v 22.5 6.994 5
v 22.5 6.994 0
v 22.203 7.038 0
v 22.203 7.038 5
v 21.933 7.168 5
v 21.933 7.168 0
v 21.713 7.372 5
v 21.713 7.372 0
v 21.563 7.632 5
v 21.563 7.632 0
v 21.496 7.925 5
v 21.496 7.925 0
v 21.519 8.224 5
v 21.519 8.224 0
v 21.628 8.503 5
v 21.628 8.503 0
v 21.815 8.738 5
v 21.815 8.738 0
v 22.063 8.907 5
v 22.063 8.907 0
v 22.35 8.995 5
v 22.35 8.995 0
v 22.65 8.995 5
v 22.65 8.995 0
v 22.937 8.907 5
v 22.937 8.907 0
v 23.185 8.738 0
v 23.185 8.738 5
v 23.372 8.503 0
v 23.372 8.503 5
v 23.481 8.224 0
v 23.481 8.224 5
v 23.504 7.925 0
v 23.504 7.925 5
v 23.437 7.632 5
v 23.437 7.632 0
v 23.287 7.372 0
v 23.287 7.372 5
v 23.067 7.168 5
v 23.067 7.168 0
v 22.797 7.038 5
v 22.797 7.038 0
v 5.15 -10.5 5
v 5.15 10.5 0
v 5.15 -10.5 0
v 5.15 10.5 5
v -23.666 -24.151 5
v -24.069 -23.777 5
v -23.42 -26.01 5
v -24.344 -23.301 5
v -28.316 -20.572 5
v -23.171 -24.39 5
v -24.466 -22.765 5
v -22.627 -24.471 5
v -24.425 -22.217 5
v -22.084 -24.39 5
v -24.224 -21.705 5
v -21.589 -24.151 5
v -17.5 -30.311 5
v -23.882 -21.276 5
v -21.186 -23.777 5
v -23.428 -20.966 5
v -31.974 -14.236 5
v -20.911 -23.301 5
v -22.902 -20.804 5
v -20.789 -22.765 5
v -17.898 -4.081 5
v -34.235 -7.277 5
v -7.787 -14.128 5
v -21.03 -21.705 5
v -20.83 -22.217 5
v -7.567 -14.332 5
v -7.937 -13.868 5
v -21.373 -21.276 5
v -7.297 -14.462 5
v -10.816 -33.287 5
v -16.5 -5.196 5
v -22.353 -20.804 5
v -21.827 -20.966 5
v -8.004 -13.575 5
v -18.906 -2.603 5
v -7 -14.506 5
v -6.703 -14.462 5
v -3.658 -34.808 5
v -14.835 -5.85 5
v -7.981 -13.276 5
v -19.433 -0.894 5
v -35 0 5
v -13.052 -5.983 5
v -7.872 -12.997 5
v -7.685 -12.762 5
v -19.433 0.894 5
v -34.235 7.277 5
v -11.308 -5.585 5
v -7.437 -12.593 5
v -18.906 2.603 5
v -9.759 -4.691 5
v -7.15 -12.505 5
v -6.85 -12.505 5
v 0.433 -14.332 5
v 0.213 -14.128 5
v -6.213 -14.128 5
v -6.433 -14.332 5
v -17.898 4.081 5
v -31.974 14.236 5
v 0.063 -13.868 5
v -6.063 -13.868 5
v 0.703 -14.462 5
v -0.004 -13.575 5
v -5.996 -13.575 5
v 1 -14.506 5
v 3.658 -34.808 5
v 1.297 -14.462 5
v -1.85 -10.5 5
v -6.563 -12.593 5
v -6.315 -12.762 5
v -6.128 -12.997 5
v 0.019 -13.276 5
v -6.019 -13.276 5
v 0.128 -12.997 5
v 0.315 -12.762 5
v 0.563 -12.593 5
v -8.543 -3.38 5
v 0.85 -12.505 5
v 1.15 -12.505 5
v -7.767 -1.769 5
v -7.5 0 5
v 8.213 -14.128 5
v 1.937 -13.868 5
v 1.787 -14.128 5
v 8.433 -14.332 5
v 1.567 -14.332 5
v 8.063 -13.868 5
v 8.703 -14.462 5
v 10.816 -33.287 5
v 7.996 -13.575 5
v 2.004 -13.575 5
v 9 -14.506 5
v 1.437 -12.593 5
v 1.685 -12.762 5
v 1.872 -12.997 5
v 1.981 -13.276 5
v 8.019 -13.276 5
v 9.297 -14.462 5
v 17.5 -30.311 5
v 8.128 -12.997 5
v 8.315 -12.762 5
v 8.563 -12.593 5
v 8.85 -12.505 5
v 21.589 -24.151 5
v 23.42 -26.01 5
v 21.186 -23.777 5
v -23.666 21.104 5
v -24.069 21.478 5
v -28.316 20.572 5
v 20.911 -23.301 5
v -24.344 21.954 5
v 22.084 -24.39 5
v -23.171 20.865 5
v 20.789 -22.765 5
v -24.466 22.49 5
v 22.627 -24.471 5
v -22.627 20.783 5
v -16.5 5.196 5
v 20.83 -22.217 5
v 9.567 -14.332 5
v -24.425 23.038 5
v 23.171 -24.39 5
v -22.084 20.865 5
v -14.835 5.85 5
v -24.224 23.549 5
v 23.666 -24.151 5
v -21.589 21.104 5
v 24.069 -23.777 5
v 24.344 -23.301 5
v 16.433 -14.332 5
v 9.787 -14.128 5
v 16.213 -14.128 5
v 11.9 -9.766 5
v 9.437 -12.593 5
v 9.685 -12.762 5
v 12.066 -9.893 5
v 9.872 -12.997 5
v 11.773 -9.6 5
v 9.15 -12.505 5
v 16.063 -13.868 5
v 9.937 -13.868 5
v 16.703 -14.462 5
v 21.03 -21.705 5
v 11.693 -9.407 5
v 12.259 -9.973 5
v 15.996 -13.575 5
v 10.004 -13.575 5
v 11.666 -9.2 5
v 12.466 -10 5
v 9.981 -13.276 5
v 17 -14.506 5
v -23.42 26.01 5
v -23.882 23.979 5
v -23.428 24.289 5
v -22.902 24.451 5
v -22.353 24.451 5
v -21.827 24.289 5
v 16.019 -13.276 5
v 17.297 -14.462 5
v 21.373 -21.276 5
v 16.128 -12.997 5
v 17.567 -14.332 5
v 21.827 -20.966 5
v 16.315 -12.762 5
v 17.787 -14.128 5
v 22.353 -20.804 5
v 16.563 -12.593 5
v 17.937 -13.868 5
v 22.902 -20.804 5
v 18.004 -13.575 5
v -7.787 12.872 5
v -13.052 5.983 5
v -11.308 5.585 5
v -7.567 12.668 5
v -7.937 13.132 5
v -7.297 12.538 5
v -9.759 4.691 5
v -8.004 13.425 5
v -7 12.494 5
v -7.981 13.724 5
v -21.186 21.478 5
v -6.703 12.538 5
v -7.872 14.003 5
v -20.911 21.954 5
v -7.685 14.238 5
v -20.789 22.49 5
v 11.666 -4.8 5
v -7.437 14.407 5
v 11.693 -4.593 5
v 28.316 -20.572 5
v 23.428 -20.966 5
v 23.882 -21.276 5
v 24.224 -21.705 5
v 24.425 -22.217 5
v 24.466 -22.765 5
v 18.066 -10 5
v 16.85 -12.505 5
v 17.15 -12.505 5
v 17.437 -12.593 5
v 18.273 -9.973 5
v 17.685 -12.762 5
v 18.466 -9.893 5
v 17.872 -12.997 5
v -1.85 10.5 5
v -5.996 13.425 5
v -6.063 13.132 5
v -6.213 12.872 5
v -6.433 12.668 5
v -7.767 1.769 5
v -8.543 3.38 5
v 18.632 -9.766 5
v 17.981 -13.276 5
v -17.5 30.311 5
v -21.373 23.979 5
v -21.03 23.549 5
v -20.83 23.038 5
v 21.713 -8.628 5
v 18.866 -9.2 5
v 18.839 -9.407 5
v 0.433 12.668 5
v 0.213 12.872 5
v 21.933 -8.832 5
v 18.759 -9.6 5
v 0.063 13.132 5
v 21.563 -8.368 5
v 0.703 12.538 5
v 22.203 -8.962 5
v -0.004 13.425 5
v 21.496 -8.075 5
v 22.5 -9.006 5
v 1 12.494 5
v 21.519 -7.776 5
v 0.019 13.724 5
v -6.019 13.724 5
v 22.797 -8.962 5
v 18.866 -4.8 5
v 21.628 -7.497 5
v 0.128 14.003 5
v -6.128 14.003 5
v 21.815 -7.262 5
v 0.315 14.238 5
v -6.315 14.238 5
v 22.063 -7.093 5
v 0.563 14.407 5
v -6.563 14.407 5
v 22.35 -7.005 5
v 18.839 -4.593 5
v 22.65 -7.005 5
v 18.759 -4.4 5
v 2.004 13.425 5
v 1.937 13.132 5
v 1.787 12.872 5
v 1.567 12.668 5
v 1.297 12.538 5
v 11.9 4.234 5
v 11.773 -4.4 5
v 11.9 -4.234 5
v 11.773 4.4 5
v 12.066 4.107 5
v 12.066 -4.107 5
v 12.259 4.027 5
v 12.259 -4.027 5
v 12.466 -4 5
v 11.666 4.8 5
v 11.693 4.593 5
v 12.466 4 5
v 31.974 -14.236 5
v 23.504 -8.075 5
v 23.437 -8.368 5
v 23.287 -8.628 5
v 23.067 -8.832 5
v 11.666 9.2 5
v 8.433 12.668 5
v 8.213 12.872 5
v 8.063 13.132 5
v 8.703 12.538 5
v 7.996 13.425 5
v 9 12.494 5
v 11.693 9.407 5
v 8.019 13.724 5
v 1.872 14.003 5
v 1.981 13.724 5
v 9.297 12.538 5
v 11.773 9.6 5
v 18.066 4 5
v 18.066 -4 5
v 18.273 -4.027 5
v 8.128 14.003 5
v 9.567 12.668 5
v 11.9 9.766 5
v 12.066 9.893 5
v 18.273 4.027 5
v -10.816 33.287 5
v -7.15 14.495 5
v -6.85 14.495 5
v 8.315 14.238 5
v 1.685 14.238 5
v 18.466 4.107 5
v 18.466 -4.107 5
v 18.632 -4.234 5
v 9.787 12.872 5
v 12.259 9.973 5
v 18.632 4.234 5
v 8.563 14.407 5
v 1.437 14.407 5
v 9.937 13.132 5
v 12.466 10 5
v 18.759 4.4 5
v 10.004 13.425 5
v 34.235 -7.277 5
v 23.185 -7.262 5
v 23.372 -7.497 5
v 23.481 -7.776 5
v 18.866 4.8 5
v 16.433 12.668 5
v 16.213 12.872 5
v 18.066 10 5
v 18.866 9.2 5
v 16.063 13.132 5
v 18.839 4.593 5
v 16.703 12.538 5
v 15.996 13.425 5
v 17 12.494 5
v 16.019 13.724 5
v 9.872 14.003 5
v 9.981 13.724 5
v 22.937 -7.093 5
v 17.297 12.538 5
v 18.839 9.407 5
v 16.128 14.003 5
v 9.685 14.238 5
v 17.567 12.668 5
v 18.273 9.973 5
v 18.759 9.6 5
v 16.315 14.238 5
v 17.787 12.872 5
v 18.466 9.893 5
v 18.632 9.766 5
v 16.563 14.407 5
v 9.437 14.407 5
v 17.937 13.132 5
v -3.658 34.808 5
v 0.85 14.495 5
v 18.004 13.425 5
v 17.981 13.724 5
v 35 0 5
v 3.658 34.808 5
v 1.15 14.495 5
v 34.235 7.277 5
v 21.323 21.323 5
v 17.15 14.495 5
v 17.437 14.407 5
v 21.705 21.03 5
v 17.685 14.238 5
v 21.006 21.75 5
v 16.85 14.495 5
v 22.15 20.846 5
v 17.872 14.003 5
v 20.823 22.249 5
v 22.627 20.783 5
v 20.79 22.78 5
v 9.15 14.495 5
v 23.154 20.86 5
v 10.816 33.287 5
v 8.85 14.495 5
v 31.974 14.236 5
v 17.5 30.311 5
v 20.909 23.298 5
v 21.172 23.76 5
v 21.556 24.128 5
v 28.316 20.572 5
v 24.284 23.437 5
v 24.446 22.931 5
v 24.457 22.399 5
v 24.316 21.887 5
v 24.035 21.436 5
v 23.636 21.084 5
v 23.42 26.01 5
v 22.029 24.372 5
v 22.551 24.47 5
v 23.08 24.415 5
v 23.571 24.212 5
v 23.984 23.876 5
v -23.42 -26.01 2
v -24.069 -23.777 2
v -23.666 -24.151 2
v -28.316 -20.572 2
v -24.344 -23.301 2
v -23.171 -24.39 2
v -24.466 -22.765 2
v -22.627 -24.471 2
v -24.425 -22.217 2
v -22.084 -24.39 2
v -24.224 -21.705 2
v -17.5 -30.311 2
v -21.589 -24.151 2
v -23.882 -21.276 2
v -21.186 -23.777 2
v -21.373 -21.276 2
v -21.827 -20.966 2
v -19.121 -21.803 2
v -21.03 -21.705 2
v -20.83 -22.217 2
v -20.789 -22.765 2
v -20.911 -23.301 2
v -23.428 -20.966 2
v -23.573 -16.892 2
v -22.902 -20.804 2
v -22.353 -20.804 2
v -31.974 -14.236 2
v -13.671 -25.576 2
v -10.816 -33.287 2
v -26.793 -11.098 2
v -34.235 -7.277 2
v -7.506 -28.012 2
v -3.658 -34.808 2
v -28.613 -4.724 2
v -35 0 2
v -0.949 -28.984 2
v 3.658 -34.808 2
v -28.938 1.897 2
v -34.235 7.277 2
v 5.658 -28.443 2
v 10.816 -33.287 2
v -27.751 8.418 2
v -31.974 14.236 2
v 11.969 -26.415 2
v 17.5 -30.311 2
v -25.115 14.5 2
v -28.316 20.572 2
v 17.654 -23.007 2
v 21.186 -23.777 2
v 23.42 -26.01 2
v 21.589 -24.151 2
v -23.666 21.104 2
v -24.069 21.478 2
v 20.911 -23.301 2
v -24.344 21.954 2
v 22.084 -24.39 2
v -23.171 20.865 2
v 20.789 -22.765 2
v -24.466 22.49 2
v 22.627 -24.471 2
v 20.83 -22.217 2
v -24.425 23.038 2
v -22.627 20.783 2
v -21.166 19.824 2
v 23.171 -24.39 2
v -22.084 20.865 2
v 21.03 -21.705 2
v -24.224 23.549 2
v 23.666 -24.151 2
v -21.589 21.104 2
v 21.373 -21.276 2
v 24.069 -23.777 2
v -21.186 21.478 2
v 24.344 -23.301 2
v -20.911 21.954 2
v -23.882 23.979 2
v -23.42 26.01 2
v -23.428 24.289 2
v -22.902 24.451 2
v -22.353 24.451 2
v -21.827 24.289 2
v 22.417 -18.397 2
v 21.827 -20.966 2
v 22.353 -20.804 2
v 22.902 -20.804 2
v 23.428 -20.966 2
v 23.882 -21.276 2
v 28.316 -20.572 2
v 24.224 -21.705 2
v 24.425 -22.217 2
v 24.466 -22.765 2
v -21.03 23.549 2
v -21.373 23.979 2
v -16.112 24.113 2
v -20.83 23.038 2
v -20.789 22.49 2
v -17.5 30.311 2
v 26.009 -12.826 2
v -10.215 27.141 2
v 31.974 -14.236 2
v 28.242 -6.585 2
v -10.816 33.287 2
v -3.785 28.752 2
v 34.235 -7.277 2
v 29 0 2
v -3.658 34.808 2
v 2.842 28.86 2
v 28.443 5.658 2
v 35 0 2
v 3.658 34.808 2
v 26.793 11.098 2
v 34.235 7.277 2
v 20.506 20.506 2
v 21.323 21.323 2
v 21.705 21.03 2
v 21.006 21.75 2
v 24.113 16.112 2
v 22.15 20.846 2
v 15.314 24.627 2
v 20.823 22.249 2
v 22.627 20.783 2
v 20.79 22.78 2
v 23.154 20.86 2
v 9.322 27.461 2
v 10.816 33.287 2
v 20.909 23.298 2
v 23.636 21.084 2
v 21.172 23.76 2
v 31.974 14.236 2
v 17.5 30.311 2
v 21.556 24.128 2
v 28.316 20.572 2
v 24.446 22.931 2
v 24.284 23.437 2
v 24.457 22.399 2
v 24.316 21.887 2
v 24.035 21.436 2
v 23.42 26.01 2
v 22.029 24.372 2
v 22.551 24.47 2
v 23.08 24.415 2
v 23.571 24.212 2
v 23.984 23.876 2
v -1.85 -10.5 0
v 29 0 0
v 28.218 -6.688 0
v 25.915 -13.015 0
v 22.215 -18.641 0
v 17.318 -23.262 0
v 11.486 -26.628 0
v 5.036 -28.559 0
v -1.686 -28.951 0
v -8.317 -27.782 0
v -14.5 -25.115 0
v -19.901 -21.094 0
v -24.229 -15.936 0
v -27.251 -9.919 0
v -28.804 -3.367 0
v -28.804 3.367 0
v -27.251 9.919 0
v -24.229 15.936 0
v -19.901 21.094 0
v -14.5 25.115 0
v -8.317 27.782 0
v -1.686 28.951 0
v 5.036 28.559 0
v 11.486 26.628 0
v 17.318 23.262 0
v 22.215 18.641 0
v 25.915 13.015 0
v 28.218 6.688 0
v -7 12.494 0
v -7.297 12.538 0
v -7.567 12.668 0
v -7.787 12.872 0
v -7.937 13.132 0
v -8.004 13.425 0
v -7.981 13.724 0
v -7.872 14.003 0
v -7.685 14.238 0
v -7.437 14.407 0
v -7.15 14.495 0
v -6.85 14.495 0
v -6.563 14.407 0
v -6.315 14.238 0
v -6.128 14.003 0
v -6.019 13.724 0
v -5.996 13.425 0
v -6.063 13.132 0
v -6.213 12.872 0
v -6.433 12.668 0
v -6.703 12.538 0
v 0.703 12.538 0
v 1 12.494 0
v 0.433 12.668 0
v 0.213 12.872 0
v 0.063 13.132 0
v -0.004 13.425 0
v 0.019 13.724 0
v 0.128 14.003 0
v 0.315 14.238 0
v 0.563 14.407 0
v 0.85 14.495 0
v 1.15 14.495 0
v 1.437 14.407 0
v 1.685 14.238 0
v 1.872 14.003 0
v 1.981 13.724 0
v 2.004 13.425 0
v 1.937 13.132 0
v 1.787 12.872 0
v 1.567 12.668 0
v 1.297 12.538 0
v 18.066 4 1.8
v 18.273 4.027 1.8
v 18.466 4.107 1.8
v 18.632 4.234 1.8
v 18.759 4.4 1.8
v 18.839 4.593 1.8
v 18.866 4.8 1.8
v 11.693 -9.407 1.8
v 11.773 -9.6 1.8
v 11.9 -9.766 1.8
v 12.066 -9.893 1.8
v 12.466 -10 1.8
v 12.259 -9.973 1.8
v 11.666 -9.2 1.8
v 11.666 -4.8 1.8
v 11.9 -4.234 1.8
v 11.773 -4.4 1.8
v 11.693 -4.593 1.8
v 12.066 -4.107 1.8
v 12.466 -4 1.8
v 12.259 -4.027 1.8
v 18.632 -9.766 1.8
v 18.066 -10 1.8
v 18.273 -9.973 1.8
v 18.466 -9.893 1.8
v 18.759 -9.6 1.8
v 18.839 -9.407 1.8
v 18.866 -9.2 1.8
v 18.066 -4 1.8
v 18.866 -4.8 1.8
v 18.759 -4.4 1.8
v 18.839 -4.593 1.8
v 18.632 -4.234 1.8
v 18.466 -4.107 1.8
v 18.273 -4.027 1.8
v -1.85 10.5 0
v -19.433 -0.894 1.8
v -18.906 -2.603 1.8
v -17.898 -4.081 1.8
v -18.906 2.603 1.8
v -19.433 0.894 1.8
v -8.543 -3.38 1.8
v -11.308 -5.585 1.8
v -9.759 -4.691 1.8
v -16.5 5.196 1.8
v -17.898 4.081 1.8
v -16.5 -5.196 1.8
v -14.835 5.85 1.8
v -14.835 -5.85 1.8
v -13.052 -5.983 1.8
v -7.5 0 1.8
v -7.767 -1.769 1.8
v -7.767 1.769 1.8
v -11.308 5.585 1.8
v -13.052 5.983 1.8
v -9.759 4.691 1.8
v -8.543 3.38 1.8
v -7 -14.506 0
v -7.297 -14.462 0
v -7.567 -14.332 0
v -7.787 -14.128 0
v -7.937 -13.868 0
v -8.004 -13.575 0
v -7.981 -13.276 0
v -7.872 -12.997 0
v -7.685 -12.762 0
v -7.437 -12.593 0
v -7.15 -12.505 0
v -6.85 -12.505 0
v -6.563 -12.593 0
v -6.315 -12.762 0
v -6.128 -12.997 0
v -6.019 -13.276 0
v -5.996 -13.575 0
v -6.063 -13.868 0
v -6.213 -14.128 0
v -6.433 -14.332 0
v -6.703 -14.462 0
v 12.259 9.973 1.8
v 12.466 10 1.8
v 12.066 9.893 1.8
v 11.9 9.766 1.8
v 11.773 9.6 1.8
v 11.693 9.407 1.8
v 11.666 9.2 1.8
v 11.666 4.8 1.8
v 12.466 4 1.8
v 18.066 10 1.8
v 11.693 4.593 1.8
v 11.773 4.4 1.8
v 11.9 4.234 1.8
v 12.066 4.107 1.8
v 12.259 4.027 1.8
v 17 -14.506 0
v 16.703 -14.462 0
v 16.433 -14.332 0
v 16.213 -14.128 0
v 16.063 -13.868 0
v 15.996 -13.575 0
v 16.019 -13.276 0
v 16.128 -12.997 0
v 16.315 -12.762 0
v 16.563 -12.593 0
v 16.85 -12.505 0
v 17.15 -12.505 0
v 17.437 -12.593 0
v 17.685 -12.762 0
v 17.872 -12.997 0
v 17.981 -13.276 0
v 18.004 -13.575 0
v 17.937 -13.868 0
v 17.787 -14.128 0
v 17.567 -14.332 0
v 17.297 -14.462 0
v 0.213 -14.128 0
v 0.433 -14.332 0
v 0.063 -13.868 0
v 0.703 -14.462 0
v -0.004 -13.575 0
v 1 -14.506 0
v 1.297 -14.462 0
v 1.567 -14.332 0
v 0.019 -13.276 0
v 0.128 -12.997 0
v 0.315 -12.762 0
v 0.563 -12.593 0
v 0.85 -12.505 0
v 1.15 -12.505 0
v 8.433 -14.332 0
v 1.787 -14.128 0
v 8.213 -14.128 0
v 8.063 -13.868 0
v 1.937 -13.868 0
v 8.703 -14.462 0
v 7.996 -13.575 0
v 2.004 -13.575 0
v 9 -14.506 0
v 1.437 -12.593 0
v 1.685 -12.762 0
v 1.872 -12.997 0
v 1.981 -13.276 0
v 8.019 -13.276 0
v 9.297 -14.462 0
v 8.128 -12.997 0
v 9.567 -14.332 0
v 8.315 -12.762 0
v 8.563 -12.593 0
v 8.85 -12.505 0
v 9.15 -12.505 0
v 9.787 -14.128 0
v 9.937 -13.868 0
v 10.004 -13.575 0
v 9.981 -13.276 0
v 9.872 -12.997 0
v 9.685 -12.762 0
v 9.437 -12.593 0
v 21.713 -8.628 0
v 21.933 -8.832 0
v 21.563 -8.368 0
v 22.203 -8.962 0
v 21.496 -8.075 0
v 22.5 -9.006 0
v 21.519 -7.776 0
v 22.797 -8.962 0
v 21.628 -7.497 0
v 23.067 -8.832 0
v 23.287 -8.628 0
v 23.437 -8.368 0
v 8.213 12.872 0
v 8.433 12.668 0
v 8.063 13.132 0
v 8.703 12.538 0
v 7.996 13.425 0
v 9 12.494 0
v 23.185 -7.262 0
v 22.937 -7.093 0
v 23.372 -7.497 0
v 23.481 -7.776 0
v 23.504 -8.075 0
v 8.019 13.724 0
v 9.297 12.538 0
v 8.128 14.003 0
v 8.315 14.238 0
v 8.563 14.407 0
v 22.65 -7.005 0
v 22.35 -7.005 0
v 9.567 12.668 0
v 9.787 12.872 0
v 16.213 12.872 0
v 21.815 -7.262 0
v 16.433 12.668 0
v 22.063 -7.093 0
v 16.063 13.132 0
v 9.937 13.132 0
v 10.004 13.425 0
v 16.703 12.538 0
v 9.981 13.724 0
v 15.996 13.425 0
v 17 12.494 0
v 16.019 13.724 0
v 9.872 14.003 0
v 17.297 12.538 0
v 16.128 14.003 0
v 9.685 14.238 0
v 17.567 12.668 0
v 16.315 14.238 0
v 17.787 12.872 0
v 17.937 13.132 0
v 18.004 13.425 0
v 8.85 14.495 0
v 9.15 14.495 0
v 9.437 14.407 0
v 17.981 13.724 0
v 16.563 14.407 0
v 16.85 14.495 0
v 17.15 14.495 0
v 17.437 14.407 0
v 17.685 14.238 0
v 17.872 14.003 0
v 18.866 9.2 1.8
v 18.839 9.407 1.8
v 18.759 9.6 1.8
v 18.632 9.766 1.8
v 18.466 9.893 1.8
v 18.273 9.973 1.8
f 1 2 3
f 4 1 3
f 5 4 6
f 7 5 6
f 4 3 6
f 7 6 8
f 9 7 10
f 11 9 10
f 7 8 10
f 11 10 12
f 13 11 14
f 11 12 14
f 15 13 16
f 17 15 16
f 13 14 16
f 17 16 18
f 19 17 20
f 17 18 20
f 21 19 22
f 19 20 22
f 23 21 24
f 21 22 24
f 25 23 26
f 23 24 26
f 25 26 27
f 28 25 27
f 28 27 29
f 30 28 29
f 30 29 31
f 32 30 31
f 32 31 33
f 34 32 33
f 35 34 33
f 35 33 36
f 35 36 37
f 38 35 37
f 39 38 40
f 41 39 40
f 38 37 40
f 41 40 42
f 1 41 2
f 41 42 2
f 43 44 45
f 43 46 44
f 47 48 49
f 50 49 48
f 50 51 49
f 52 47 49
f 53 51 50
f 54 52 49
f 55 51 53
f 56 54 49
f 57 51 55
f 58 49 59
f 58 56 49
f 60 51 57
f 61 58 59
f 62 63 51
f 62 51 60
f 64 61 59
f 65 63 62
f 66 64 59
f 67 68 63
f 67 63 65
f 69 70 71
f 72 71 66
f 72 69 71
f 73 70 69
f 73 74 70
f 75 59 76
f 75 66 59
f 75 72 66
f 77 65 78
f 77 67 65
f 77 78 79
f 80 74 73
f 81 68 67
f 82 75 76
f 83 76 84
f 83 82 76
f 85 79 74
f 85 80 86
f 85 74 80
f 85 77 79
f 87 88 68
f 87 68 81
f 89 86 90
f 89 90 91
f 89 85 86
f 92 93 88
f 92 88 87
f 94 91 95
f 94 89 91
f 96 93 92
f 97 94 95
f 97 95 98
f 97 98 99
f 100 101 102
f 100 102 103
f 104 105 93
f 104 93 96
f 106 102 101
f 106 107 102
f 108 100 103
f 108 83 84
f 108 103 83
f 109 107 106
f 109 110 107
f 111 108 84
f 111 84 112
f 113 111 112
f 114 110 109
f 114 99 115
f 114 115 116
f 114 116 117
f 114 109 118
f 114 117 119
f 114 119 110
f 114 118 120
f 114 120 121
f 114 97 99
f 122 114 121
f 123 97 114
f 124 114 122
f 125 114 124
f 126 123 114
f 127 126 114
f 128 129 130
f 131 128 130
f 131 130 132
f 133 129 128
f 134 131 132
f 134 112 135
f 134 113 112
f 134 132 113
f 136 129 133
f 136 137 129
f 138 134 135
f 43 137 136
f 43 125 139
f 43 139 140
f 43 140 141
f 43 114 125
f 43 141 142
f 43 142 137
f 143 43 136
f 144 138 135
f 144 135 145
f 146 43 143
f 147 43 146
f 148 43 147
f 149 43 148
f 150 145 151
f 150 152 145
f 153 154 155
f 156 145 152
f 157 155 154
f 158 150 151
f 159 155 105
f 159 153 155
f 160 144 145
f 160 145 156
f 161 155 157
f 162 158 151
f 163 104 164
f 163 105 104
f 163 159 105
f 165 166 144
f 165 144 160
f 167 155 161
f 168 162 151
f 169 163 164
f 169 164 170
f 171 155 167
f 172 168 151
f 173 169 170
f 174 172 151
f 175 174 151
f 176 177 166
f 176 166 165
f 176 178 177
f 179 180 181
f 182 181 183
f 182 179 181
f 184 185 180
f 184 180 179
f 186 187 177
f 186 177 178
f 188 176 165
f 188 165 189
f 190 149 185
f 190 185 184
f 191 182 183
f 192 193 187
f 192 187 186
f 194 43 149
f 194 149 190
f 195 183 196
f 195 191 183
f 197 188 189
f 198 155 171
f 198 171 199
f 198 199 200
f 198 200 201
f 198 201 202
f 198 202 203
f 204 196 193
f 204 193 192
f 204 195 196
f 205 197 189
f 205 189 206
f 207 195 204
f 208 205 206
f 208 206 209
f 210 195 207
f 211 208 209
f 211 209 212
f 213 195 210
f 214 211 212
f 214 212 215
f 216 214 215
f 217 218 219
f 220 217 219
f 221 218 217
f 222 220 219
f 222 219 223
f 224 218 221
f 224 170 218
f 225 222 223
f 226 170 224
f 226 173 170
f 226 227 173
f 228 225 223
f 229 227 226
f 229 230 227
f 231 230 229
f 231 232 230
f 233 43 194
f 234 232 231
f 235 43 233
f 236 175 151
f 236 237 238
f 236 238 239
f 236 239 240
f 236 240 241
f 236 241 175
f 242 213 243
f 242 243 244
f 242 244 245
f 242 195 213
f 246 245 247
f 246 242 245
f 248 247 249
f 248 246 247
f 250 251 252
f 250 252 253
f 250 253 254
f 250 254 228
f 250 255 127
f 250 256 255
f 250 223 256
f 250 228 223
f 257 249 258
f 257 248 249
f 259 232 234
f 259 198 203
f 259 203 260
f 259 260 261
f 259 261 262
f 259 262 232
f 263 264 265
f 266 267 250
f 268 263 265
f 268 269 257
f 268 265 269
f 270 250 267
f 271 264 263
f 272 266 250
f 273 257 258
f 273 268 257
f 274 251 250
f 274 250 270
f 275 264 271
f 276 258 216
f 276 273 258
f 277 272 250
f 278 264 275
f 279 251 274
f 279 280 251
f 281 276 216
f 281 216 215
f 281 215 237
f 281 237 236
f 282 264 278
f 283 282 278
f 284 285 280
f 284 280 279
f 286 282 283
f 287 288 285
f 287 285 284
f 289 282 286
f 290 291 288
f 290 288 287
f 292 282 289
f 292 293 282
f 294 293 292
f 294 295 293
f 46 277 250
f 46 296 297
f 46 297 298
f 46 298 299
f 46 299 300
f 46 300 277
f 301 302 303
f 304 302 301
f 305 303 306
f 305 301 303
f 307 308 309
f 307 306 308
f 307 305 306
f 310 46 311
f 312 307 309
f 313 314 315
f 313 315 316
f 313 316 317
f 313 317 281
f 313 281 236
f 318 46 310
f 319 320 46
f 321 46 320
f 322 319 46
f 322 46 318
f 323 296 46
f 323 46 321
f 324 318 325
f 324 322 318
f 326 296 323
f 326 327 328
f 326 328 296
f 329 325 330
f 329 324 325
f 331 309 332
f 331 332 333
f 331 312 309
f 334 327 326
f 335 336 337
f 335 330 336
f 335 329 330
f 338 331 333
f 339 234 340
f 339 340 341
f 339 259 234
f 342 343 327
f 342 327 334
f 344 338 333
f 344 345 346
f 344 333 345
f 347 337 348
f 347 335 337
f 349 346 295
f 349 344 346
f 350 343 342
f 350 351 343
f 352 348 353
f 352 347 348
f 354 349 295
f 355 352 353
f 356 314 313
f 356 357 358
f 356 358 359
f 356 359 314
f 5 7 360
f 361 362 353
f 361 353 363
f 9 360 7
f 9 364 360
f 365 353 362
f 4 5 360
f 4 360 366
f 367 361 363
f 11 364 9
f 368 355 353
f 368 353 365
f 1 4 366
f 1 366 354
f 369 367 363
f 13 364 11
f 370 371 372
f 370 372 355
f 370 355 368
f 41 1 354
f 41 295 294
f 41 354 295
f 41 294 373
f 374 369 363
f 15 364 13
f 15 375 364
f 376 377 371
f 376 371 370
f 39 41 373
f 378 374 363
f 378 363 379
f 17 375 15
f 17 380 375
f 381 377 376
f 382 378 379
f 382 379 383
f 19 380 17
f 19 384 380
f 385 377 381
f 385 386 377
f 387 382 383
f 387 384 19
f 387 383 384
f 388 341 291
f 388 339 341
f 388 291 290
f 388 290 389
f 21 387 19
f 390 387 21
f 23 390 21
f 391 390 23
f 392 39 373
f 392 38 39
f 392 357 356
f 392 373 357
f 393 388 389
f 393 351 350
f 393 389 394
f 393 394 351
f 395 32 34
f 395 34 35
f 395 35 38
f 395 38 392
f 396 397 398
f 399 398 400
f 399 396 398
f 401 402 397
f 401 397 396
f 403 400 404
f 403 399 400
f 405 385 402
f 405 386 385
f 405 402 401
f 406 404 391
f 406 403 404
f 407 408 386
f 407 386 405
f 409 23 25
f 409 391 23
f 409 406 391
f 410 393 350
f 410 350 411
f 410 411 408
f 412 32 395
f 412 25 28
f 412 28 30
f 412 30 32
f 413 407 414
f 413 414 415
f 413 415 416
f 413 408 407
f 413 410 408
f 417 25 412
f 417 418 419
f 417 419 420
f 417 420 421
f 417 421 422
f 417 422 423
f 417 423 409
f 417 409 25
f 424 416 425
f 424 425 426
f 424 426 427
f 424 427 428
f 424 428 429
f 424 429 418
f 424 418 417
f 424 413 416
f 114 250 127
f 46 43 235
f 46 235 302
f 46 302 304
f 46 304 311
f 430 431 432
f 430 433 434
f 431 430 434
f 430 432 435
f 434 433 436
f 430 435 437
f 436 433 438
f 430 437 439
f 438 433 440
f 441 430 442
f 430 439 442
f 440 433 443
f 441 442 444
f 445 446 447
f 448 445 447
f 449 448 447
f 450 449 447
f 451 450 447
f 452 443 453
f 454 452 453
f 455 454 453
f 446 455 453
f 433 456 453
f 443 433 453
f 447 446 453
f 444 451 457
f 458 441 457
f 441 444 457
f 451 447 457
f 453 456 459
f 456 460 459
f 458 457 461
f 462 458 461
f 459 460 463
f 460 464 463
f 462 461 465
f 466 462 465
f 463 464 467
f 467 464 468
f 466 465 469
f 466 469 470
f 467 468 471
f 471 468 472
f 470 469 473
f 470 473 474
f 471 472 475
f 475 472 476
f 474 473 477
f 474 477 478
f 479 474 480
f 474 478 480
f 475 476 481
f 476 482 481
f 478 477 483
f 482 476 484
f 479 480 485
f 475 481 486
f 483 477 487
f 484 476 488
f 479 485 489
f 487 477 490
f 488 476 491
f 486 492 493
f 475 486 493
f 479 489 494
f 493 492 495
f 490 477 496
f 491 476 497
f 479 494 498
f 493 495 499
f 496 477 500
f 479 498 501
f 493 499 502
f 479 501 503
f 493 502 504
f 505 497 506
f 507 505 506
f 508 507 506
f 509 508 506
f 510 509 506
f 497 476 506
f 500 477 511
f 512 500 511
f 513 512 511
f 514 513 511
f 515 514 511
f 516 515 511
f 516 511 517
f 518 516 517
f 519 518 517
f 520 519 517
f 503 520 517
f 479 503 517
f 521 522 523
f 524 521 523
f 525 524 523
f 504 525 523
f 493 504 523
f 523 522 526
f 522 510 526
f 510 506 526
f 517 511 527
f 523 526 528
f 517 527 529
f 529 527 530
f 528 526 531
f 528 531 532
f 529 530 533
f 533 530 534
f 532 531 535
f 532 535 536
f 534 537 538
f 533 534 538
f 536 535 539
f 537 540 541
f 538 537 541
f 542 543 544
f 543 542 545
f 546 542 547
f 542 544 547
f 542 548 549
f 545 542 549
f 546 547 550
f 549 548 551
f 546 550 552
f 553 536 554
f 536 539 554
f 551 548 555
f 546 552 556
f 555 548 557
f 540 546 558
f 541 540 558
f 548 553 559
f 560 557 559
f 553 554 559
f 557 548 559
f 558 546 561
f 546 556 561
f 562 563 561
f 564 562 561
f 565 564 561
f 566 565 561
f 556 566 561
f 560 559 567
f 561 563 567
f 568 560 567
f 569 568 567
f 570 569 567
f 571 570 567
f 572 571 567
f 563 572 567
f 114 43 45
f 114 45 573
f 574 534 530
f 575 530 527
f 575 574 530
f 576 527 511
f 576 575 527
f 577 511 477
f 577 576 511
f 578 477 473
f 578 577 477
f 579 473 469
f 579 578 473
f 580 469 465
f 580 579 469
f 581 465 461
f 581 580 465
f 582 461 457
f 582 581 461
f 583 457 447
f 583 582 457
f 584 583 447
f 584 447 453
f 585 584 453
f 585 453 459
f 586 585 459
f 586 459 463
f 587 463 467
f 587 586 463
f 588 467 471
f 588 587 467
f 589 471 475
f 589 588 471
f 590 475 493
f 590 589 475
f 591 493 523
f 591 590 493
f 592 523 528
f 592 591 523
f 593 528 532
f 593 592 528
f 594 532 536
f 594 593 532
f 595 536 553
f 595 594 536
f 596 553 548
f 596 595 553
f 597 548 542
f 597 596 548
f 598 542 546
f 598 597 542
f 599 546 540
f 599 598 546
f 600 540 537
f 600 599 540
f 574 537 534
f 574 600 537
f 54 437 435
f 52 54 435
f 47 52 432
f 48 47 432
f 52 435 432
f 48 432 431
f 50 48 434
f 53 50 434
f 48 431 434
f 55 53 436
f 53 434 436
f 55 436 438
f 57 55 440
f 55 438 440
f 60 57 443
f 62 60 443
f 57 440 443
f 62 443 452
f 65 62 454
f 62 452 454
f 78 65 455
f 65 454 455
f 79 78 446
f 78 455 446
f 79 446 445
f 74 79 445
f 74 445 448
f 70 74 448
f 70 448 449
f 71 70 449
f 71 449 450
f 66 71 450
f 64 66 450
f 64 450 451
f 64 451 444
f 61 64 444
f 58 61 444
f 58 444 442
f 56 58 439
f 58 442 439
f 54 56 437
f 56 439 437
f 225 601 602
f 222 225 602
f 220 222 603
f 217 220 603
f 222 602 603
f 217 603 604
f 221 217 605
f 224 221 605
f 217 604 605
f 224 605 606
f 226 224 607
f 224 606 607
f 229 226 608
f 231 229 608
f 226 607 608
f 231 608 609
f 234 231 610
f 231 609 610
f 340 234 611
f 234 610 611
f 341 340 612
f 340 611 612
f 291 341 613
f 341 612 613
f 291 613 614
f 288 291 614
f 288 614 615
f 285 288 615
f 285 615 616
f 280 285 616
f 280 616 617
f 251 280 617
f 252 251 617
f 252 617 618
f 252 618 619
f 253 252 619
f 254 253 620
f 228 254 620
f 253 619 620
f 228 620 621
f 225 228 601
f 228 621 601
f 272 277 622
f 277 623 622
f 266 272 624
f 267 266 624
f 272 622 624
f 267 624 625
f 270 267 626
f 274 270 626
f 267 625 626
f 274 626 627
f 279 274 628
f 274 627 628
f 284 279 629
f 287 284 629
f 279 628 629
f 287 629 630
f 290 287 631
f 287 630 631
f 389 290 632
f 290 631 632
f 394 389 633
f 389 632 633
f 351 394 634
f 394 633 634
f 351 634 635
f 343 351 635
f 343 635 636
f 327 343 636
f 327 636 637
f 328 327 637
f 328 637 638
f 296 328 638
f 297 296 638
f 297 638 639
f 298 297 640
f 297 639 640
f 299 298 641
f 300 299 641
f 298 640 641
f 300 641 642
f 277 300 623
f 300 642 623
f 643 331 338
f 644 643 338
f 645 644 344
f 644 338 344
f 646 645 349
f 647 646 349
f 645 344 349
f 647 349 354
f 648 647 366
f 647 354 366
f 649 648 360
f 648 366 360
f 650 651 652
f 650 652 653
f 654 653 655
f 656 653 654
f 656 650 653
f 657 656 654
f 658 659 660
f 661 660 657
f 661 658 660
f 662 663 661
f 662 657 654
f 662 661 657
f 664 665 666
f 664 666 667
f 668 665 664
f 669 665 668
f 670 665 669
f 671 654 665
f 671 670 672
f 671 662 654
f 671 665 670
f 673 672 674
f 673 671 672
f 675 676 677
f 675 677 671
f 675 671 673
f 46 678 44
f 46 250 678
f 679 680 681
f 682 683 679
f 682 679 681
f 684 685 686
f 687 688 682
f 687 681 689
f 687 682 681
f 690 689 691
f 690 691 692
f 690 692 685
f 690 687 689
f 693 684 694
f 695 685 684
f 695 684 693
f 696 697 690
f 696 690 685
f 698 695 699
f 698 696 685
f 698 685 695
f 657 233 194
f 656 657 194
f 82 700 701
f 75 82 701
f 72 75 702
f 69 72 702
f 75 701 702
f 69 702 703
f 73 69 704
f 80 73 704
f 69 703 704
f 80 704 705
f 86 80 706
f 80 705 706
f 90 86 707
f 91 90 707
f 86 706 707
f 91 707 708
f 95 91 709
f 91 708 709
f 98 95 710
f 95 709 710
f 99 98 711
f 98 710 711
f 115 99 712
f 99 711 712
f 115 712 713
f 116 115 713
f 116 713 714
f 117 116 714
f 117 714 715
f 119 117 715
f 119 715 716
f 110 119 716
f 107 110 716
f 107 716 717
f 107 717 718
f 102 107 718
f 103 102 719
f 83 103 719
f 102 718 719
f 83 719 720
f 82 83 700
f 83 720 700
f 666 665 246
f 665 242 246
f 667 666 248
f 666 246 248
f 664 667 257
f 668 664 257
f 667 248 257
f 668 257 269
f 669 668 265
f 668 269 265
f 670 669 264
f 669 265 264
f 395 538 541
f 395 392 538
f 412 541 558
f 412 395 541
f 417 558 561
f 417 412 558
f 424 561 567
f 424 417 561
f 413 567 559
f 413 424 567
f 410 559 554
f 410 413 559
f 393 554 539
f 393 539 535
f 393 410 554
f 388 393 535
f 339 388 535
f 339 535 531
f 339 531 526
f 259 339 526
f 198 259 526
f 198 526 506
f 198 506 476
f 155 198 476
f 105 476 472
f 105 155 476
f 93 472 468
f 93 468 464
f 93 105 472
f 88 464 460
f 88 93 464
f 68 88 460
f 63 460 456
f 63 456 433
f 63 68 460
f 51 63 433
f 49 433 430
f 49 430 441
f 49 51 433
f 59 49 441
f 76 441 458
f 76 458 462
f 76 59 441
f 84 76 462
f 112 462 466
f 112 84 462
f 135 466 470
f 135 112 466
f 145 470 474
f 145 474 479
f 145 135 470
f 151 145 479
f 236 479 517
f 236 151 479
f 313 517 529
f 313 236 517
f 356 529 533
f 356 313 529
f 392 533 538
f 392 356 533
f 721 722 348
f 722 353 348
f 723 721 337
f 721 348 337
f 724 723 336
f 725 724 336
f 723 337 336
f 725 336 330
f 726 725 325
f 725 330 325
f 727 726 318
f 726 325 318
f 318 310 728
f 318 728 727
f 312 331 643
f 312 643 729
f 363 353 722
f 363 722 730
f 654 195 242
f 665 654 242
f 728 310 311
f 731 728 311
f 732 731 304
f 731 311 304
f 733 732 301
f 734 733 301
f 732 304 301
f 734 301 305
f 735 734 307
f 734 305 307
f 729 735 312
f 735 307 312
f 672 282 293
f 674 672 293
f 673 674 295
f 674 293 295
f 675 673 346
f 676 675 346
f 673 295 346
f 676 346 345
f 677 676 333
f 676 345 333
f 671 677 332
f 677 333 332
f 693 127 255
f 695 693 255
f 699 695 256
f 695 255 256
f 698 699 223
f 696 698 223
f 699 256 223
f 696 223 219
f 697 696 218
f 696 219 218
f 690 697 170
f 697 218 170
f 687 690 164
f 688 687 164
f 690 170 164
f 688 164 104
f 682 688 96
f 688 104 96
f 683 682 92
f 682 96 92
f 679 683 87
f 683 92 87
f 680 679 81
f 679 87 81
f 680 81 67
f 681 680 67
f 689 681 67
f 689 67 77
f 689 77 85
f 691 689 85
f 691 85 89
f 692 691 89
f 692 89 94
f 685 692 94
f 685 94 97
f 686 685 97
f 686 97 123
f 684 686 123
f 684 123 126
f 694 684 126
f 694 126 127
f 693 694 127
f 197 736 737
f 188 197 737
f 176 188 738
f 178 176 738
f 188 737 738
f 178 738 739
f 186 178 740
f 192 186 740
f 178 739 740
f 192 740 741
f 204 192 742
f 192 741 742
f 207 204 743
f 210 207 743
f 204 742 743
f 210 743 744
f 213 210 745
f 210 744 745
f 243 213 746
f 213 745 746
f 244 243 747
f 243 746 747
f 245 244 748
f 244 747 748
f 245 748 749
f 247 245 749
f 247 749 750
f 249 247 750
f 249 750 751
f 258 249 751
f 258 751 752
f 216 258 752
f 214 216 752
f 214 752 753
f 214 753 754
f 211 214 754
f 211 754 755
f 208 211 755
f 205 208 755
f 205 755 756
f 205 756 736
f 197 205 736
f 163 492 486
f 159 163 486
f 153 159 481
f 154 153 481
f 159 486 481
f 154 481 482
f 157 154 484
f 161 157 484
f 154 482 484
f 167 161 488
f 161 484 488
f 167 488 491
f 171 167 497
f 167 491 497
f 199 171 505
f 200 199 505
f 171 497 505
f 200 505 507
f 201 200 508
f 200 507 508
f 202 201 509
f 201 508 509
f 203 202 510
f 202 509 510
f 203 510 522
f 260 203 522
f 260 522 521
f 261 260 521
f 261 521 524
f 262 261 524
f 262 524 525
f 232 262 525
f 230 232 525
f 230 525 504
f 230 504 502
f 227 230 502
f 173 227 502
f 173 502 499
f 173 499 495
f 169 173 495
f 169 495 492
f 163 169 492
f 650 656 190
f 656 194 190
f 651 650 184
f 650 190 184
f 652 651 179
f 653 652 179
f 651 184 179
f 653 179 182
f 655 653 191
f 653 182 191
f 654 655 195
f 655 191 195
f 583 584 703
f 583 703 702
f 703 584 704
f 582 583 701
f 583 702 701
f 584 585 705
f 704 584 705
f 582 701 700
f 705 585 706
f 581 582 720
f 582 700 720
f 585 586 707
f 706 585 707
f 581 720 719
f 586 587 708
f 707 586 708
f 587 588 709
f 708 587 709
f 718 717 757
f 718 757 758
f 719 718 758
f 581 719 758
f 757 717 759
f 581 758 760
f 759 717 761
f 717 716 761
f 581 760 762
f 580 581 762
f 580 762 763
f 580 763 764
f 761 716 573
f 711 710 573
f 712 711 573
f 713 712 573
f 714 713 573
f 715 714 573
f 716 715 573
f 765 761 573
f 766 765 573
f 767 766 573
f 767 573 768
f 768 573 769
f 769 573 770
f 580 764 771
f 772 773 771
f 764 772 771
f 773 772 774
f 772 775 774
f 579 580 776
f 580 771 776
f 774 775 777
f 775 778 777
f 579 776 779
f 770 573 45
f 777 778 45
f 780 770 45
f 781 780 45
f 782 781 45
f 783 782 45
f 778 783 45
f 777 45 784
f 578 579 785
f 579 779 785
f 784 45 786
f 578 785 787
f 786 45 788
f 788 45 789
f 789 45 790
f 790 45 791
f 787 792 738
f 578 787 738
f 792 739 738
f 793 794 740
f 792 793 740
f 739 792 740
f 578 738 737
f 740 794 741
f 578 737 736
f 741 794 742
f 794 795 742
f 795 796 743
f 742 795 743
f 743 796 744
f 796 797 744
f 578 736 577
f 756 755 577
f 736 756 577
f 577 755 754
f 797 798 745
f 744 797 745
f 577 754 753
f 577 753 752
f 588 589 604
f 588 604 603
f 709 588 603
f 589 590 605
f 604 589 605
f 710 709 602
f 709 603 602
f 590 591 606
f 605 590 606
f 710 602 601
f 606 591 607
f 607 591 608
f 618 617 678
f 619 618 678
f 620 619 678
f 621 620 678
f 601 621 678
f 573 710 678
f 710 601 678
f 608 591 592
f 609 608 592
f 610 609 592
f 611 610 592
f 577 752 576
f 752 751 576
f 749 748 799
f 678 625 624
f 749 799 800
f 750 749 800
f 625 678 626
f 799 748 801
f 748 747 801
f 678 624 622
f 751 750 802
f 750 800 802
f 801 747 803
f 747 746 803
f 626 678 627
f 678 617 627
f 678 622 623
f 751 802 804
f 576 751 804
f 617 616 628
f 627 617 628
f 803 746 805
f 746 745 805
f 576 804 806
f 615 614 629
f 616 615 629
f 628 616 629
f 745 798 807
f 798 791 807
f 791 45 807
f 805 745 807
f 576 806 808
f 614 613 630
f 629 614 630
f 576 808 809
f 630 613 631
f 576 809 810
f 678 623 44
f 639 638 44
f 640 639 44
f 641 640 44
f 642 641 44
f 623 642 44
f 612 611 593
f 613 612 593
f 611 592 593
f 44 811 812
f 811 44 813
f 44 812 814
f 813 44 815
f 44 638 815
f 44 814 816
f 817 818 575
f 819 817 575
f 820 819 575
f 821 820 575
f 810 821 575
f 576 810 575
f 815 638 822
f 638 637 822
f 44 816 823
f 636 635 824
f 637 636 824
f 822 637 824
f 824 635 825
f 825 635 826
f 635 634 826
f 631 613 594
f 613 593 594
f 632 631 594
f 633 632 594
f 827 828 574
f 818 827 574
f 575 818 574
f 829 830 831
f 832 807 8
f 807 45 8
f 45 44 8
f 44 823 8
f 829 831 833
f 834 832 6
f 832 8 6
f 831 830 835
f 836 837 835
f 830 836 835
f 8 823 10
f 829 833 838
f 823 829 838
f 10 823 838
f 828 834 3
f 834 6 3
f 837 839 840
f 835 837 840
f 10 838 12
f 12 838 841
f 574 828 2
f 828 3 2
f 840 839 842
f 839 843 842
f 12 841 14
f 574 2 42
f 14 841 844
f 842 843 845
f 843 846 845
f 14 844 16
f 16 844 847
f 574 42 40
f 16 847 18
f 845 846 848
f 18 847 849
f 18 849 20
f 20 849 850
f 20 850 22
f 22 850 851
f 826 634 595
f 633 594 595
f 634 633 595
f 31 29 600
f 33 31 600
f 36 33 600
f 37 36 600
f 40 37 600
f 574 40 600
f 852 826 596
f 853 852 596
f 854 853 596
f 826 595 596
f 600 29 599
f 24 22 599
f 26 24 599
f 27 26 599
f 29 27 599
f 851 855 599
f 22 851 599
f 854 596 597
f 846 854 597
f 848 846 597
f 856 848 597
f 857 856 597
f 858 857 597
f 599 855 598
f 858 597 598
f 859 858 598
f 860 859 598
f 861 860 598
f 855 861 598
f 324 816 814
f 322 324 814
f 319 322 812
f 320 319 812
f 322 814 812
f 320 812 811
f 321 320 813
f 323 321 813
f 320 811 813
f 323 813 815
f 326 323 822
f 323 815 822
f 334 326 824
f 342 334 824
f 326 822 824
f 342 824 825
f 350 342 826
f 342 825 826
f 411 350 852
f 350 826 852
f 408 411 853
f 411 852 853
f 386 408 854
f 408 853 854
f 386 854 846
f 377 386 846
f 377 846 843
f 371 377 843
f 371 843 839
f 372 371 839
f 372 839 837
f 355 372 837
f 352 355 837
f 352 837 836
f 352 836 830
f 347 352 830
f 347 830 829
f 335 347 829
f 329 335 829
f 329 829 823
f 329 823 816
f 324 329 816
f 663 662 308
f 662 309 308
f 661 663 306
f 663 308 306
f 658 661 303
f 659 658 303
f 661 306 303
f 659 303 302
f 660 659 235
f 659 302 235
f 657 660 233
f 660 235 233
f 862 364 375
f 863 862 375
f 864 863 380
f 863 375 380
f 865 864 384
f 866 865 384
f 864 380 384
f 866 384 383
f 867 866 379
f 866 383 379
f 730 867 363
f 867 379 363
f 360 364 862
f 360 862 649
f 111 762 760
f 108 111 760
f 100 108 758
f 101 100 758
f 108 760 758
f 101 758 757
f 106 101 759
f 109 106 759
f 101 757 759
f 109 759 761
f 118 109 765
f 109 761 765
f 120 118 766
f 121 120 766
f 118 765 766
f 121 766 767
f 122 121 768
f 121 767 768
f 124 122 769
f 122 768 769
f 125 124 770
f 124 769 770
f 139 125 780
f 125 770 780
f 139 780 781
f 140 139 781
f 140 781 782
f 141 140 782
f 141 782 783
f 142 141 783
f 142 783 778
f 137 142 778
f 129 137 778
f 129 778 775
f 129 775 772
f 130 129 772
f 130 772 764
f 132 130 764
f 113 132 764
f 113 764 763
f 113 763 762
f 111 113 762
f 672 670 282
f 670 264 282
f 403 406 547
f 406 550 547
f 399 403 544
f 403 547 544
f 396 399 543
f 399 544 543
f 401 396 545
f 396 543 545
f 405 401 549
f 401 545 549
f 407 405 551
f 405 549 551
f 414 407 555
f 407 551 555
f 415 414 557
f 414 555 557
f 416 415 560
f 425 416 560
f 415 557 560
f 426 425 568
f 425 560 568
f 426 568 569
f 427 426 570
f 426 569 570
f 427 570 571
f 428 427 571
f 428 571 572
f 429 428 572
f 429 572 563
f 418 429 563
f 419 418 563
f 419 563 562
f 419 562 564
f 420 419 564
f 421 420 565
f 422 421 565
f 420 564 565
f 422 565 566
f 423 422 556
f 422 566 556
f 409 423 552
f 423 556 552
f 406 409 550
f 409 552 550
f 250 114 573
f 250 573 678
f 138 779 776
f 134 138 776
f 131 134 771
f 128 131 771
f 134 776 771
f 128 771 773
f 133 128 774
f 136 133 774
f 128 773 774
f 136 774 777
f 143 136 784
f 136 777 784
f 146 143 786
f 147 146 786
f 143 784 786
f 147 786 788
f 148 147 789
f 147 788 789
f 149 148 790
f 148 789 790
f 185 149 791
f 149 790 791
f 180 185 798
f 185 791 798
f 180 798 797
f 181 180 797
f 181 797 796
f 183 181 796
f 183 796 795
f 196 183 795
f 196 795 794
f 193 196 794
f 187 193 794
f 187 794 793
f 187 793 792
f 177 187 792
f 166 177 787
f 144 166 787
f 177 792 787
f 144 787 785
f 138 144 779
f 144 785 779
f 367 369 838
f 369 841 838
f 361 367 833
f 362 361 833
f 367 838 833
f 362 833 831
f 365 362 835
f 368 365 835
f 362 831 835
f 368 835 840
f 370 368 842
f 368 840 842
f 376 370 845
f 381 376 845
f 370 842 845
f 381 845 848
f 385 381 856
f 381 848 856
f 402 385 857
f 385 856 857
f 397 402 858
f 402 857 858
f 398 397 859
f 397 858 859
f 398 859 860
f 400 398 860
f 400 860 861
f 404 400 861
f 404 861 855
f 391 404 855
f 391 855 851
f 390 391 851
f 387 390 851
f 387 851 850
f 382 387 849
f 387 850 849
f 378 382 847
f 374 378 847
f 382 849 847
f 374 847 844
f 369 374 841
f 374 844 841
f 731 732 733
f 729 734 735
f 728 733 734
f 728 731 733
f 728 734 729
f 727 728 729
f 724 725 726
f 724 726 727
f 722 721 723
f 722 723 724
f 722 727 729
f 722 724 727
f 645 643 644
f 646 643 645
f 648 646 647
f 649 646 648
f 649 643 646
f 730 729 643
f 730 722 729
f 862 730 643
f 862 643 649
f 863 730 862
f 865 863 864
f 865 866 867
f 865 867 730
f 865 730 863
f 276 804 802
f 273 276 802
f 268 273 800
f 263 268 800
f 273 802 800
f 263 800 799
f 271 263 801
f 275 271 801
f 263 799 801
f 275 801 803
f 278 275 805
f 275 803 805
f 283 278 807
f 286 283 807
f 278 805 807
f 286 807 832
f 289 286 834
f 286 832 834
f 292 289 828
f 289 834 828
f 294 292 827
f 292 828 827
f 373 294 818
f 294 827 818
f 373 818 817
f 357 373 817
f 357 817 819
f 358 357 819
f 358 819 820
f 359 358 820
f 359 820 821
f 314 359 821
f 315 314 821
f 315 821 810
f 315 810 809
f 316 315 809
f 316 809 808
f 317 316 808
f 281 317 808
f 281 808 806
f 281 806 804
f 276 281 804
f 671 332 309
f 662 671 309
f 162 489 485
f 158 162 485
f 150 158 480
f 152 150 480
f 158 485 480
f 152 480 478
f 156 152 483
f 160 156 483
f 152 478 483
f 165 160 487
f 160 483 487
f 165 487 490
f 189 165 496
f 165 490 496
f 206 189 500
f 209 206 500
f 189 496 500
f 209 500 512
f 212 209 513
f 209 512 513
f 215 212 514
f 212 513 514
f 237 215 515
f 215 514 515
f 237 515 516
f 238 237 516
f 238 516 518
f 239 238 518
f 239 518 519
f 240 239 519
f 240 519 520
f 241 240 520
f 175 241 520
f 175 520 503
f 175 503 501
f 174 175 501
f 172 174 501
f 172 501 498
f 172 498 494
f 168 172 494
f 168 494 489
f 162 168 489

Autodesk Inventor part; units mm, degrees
ref_plane "YZ Plane" through (0, 0, 0) normal (1, 0, 0) x (0, 1, 0)
ref_plane "XZ Plane" through (0, 0, 0) normal (0, 1, 0) x (-1, 0, 0)
ref_plane "XY Plane" through (0, 0, 0) normal (0, 0, 1) x (1, 0, 0)
sketch "Boceto1" plane through (0, 0, 0) normal (0, 0, 1) x (1, 0, 0)
  circle A0 centre (0, 0) radius 29
  dimension "Diametro" = 58
extrude "Extrusión1" add sketch "Boceto1" along normal blind 5
sketch "Boceto2" plane through (0, 0, 5) normal (0, 0, 1) x (1, 0, 0)
  circle A0 centre (1, -13.5) radius 1
  arc A1 (11.666, -9.2) -> (12.466, -10) centre (12.466, -9.2) ccw
  line L0 (5.15, -10.5) -> (-1.85, -10.5)
  circle A2 centre (9, -13.5) radius 1
  line L1 (5.15, 10.5) -> (5.15, -10.5)
  line L2 (25, 16) -> (25, -16)
  line L3 (25, -16) -> (-25, -16)
  line L4 (-25, 16) -> (25, 16)
  line L5 (-25, -16) -> (25, 16) construction
  line L6 (25, -16) -> (-25, 16) construction
  arc A3 (18.866, -4.8) -> (18.066, -4) centre (18.066, -4.8) ccw
  line L7 (18.066, -4) -> (12.466, -4)
  line L8 (12.466, -10) -> (18.066, -10)
  line L9 (15.266, -4) -> (12.466, -4)
  line L10 (11.666, -4.8) -> (11.666, -9.2)
  line L11 (18.866, -9.2) -> (18.866, -4.8)
  arc A4 (12.466, -4) -> (11.666, -4.8) centre (12.466, -4.8) ccw
  line L12 (-1.85, -10.5) -> (-1.85, 0)
  circle A5 centre (-7, -13.5) radius 1
  line L13 (-25, -16) -> (-25, 16)
  line L14 (-1.85, 0) -> (-1.85, 10.5)
  circle A6 centre (-13.5, 0) radius 6
  circle A7 centre (1, 13.5) radius 1
  line L15 (-1.85, 10.5) -> (5.15, 10.5)
  circle A8 centre (-7, 13.5) radius 1
  arc A9 (18.066, -10) -> (18.866, -9.2) centre (18.066, -9.2) ccw
  circle A10 centre (22.5, -8) radius 1
  circle A11 centre (17, -13.5) radius 1
  circle A12 centre (9, 13.5) radius 1
  arc A13 (12.466, 10) -> (11.666, 9.2) centre (12.466, 9.2) ccw
  line L16 (11.666, 4.8) -> (11.666, 9.2)
  arc A14 (11.666, 4.8) -> (12.466, 4) centre (12.466, 4.8) ccw
  circle A15 centre (17, 13.5) radius 1
  line L17 (15.266, 4) -> (12.466, 4)
  line L18 (12.466, 10) -> (18.066, 10)
  arc A16 (18.866, 9.2) -> (18.066, 10) centre (18.066, 9.2) ccw
  line L19 (18.066, 4) -> (15.266, 4)
  line L20 (18.866, 9.2) -> (18.866, 4.8)
  arc A17 (18.066, 4) -> (18.866, 4.8) centre (18.066, 4.8) ccw
  circle A18 centre (22.5, 8) radius 1
  point P0 (0, 0)
  dimension "d3" = 50
  dimension "d4" = 32
  dimension "d5" = 12
  dimension "d6" = 11.65
  dimension "d7" = 10.5
  dimension "d8" = 7
  dimension "d9" = 21
  dimension "d10" = 2.8
  dimension "d11" = 4.4
  dimension "d12" = 5.6
  dimension "d13" = 4.4
  dimension "d14" = 0.8
  dimension "d15" = 0.8
  dimension "d16" = 0.8
  dimension "d17" = 0.8
  dimension "d18" = 0.8
  dimension "d19" = 0.8
  dimension "d20" = 2
  dimension "d21" = 2
  dimension "d22" = 2
  dimension "d23" = 2
  dimension "d24" = 2
  dimension "d25" = 2
  dimension "d26" = 2
  dimension "d27" = 2
  dimension "d28" = 2
  dimension "d29" = 2
extrude "Extrusión2" cut sketch "Boceto2" against normal blind 3.2 contours L10 A4 L7 A3 L11 A9 L8 A1 | A6 | L18 A16 L20 A17 L19 L17 A14 L16 A13
extrude "Extrusión3" cut sketch "Boceto2" against normal blind 5 contours L0 L12 L14 L15 L1
sketch "Boceto3" plane through (0, 0, 5) normal (0, 0, 1) x (1, 0, 0)
  circle A0 centre (0, 0) radius 35
  circle A1 centre (0, 0) radius 29
  line L0 (0, 0) -> (22.6274, 22.6274)
  line L1 (0, 0) -> (32, 0) construction
  circle A2 centre (22.6274, 22.6274) radius 1.5
  circle A3 centre (-22.6274, 22.6274) radius 1.5
  circle A4 centre (-22.6274, -22.6274) radius 1.5
  circle A5 centre (22.6274, -22.6274) radius 1.5
  dimension "d34" = 70
  dimension "d35" = 58
  dimension "d40" = 32
  dimension "d41" = 45
  dimension "d42" = 3
  dimension "d45" = 360
extrude "Extrusión4" add sketch "Boceto3" against normal blind 3 contours A0 | A2 | A3 | A4 | A5
hole "Agujero1" at (22.6274, 22.6274, 5) at (-22.6274, 22.6274, 5) at (-22.6274, -22.6274, 5) at (22.6274, -22.6274, 5) direction (0, 0, -1) diameter 3.6881 depth 13 thread size "M4.5x0.75" class "6H" standard "ISO Metric profile"
hole "Agujero2" at (-7, -13.5, 5) at (1, -13.5, 5) at (9, -13.5, 5) at (17, -13.5, 5) at (22.5, -8, 5) at (22.5, 8, 5) at (17, 13.5, 5) at (9, 13.5, 5) at (1, 13.5, 5) at (-7, 13.5, 5) direction (0, 0, -1) diameter 2.013 depth 7.6 thread size "M2.5x0.45" class "6H" standard "ISO Metric profile"
equation "\"d35\" = Diametro"
properties part number "TE_01" material "PETG"
